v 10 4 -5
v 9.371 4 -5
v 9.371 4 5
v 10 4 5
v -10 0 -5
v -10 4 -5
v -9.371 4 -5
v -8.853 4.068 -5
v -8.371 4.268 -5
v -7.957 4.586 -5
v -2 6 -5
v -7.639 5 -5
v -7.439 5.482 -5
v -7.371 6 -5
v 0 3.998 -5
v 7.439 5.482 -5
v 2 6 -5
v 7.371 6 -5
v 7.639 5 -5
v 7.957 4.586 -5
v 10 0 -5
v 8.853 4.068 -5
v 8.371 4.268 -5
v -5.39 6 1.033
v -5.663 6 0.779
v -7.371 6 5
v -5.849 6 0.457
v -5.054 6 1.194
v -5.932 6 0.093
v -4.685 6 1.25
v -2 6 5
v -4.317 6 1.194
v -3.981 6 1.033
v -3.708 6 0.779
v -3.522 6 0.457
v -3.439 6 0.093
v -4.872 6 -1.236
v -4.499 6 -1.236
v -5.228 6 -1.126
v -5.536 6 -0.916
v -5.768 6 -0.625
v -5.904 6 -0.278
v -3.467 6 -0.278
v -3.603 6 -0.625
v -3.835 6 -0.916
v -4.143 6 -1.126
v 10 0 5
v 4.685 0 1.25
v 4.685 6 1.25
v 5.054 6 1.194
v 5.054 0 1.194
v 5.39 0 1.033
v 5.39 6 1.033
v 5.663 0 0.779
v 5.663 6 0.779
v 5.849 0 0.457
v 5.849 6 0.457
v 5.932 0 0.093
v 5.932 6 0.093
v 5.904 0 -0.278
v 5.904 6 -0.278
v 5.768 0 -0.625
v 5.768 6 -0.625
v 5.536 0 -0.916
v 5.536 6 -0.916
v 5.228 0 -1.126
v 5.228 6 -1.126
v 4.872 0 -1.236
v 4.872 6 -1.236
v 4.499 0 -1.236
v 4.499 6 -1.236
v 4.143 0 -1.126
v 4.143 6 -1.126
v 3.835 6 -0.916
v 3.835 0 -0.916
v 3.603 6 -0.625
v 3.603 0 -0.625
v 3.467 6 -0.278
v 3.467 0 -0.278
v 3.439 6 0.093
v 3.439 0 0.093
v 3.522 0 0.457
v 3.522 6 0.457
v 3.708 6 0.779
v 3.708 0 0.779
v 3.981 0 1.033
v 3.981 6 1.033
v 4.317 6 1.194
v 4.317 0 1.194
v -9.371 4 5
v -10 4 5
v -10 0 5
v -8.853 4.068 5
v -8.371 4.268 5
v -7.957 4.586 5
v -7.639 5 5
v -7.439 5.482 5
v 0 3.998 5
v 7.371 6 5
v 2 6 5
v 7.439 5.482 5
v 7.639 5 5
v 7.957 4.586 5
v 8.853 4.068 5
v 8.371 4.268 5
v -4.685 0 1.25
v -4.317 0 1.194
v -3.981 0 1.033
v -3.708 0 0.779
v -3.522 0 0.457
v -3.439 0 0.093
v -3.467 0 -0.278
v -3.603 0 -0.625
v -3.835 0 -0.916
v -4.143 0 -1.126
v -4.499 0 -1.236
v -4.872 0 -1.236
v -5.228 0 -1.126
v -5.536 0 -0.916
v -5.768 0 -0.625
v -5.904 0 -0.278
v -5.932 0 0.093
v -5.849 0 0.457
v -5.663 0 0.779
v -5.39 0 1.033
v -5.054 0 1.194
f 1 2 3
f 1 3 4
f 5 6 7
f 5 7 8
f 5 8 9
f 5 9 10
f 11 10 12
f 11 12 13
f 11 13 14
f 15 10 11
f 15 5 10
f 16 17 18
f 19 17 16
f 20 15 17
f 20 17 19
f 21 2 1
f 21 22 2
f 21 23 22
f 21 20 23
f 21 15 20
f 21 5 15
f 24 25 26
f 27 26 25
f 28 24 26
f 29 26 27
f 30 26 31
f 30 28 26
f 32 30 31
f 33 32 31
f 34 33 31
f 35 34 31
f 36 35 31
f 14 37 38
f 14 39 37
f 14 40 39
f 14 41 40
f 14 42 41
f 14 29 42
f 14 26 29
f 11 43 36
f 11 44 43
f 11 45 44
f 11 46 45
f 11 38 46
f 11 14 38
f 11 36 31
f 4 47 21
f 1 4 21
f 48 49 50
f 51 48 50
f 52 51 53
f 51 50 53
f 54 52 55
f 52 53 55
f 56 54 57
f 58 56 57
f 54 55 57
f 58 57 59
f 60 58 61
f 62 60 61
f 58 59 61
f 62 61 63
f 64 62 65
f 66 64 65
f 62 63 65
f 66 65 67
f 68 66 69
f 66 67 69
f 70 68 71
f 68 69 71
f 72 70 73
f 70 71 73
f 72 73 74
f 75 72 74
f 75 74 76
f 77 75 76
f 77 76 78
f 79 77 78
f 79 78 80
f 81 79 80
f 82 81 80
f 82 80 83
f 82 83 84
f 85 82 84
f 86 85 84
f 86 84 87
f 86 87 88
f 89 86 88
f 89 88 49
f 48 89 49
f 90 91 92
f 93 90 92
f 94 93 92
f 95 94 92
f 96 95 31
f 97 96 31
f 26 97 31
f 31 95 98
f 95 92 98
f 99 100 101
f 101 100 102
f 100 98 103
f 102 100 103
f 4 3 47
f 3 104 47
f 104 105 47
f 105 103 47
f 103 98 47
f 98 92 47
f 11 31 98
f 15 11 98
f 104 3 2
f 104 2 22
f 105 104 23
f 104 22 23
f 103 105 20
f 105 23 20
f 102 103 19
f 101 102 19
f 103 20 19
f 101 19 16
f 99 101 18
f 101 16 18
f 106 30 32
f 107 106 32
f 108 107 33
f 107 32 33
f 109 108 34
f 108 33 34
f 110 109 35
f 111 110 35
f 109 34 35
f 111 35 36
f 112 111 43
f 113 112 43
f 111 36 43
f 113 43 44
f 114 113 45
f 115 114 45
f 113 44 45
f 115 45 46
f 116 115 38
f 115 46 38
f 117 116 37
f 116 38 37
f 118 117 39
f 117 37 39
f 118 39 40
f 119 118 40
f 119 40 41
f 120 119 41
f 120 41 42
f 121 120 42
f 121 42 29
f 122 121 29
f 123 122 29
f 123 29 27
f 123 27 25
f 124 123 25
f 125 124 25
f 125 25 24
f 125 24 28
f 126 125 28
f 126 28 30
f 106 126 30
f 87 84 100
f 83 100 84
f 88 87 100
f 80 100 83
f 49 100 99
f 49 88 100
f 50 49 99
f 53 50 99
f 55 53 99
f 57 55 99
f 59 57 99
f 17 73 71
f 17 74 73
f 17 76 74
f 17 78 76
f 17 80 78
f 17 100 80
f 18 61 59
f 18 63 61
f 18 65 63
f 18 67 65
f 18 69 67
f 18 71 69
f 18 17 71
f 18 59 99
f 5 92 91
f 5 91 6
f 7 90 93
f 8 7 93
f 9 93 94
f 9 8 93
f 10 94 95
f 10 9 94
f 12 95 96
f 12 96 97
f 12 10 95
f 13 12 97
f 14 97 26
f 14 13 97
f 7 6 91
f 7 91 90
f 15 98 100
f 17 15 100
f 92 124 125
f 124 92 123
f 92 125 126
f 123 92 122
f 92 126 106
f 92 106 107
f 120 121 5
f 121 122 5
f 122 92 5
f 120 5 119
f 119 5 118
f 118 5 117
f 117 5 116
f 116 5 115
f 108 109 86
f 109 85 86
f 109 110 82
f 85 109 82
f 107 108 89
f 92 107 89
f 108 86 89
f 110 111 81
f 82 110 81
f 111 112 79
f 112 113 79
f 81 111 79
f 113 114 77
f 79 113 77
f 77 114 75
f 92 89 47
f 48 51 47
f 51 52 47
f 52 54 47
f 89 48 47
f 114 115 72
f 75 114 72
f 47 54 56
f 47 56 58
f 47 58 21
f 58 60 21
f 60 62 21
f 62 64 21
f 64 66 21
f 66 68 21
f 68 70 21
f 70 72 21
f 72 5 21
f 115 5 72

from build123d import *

# Parameters (mm, degrees)
SKETCH1_W           = 20
SKETCH1_H           = 10
BOSS_EXTRUDE1_DEPTH = 4
SKETCH4_W           = 14.741858766
SKETCH4_H           = 10
BOSS_EXTRUDE3_DEPTH = 2
CUT_EXTRUDE2_DEPTH  = 10
SKETCH6_R           = 1.25
CUT_EXTRUDE3_DEPTH  = 10
FILLET1_R           = 2


with BuildPart() as part:
    # Sketch1 → Boss-Extrude1 (new body)
    with BuildSketch(Plane(origin=(0, 0, 0), x_dir=(1, 0, 0), z_dir=(0, 1, 0))):
        Rectangle(SKETCH1_W, SKETCH1_H)
    extrude(amount=BOSS_EXTRUDE1_DEPTH)

    # Sketch4 → Boss-Extrude3 (add)
    with BuildSketch(Plane(origin=(0, 4, 0), x_dir=(1, 0, 0), z_dir=(0, 1, 0))):
        Rectangle(SKETCH4_W, SKETCH4_H)
    extrude(amount=BOSS_EXTRUDE3_DEPTH)

    # Sketch5 → Cut-Extrude2 (cut)
    with BuildSketch(Plane.XY.offset(5)):
        Polygon((0, 3.998182385), (0, 6), (-1.5, 6), (-2, 6), align=None)
        Polygon((1.5, 6), (0, 6), (0, 3.998182385), (2, 6), align=None)
    extrude(amount=-CUT_EXTRUDE2_DEPTH, mode=Mode.SUBTRACT)

    # Sketch6 → Cut-Extrude3 (cut)
    with BuildSketch(Plane(origin=(0, 6, 0), x_dir=(1, 0, 0), z_dir=(0, 1, 0))):
        with Locations(Location((-4.685464692, 0, 0), (0, 0, 270))):
            Circle(SKETCH6_R)
        with Locations(Location((4.685464692, 0, 0), (0, 0, 270))):
            Circle(SKETCH6_R)
    extrude(amount=-CUT_EXTRUDE3_DEPTH, mode=Mode.SUBTRACT)

    # Fillet1
    fillet1_edges = [part.edges().sort_by_distance(p)[0] for p in [
        (-7.370929383, 4, 0),
        (7.370929383, 4, 0),
    ]]
    fillet(fillet1_edges, radius=FILLET1_R - 0.0001)  # a hair under: the kernel refuses the full size


solid = part.part
